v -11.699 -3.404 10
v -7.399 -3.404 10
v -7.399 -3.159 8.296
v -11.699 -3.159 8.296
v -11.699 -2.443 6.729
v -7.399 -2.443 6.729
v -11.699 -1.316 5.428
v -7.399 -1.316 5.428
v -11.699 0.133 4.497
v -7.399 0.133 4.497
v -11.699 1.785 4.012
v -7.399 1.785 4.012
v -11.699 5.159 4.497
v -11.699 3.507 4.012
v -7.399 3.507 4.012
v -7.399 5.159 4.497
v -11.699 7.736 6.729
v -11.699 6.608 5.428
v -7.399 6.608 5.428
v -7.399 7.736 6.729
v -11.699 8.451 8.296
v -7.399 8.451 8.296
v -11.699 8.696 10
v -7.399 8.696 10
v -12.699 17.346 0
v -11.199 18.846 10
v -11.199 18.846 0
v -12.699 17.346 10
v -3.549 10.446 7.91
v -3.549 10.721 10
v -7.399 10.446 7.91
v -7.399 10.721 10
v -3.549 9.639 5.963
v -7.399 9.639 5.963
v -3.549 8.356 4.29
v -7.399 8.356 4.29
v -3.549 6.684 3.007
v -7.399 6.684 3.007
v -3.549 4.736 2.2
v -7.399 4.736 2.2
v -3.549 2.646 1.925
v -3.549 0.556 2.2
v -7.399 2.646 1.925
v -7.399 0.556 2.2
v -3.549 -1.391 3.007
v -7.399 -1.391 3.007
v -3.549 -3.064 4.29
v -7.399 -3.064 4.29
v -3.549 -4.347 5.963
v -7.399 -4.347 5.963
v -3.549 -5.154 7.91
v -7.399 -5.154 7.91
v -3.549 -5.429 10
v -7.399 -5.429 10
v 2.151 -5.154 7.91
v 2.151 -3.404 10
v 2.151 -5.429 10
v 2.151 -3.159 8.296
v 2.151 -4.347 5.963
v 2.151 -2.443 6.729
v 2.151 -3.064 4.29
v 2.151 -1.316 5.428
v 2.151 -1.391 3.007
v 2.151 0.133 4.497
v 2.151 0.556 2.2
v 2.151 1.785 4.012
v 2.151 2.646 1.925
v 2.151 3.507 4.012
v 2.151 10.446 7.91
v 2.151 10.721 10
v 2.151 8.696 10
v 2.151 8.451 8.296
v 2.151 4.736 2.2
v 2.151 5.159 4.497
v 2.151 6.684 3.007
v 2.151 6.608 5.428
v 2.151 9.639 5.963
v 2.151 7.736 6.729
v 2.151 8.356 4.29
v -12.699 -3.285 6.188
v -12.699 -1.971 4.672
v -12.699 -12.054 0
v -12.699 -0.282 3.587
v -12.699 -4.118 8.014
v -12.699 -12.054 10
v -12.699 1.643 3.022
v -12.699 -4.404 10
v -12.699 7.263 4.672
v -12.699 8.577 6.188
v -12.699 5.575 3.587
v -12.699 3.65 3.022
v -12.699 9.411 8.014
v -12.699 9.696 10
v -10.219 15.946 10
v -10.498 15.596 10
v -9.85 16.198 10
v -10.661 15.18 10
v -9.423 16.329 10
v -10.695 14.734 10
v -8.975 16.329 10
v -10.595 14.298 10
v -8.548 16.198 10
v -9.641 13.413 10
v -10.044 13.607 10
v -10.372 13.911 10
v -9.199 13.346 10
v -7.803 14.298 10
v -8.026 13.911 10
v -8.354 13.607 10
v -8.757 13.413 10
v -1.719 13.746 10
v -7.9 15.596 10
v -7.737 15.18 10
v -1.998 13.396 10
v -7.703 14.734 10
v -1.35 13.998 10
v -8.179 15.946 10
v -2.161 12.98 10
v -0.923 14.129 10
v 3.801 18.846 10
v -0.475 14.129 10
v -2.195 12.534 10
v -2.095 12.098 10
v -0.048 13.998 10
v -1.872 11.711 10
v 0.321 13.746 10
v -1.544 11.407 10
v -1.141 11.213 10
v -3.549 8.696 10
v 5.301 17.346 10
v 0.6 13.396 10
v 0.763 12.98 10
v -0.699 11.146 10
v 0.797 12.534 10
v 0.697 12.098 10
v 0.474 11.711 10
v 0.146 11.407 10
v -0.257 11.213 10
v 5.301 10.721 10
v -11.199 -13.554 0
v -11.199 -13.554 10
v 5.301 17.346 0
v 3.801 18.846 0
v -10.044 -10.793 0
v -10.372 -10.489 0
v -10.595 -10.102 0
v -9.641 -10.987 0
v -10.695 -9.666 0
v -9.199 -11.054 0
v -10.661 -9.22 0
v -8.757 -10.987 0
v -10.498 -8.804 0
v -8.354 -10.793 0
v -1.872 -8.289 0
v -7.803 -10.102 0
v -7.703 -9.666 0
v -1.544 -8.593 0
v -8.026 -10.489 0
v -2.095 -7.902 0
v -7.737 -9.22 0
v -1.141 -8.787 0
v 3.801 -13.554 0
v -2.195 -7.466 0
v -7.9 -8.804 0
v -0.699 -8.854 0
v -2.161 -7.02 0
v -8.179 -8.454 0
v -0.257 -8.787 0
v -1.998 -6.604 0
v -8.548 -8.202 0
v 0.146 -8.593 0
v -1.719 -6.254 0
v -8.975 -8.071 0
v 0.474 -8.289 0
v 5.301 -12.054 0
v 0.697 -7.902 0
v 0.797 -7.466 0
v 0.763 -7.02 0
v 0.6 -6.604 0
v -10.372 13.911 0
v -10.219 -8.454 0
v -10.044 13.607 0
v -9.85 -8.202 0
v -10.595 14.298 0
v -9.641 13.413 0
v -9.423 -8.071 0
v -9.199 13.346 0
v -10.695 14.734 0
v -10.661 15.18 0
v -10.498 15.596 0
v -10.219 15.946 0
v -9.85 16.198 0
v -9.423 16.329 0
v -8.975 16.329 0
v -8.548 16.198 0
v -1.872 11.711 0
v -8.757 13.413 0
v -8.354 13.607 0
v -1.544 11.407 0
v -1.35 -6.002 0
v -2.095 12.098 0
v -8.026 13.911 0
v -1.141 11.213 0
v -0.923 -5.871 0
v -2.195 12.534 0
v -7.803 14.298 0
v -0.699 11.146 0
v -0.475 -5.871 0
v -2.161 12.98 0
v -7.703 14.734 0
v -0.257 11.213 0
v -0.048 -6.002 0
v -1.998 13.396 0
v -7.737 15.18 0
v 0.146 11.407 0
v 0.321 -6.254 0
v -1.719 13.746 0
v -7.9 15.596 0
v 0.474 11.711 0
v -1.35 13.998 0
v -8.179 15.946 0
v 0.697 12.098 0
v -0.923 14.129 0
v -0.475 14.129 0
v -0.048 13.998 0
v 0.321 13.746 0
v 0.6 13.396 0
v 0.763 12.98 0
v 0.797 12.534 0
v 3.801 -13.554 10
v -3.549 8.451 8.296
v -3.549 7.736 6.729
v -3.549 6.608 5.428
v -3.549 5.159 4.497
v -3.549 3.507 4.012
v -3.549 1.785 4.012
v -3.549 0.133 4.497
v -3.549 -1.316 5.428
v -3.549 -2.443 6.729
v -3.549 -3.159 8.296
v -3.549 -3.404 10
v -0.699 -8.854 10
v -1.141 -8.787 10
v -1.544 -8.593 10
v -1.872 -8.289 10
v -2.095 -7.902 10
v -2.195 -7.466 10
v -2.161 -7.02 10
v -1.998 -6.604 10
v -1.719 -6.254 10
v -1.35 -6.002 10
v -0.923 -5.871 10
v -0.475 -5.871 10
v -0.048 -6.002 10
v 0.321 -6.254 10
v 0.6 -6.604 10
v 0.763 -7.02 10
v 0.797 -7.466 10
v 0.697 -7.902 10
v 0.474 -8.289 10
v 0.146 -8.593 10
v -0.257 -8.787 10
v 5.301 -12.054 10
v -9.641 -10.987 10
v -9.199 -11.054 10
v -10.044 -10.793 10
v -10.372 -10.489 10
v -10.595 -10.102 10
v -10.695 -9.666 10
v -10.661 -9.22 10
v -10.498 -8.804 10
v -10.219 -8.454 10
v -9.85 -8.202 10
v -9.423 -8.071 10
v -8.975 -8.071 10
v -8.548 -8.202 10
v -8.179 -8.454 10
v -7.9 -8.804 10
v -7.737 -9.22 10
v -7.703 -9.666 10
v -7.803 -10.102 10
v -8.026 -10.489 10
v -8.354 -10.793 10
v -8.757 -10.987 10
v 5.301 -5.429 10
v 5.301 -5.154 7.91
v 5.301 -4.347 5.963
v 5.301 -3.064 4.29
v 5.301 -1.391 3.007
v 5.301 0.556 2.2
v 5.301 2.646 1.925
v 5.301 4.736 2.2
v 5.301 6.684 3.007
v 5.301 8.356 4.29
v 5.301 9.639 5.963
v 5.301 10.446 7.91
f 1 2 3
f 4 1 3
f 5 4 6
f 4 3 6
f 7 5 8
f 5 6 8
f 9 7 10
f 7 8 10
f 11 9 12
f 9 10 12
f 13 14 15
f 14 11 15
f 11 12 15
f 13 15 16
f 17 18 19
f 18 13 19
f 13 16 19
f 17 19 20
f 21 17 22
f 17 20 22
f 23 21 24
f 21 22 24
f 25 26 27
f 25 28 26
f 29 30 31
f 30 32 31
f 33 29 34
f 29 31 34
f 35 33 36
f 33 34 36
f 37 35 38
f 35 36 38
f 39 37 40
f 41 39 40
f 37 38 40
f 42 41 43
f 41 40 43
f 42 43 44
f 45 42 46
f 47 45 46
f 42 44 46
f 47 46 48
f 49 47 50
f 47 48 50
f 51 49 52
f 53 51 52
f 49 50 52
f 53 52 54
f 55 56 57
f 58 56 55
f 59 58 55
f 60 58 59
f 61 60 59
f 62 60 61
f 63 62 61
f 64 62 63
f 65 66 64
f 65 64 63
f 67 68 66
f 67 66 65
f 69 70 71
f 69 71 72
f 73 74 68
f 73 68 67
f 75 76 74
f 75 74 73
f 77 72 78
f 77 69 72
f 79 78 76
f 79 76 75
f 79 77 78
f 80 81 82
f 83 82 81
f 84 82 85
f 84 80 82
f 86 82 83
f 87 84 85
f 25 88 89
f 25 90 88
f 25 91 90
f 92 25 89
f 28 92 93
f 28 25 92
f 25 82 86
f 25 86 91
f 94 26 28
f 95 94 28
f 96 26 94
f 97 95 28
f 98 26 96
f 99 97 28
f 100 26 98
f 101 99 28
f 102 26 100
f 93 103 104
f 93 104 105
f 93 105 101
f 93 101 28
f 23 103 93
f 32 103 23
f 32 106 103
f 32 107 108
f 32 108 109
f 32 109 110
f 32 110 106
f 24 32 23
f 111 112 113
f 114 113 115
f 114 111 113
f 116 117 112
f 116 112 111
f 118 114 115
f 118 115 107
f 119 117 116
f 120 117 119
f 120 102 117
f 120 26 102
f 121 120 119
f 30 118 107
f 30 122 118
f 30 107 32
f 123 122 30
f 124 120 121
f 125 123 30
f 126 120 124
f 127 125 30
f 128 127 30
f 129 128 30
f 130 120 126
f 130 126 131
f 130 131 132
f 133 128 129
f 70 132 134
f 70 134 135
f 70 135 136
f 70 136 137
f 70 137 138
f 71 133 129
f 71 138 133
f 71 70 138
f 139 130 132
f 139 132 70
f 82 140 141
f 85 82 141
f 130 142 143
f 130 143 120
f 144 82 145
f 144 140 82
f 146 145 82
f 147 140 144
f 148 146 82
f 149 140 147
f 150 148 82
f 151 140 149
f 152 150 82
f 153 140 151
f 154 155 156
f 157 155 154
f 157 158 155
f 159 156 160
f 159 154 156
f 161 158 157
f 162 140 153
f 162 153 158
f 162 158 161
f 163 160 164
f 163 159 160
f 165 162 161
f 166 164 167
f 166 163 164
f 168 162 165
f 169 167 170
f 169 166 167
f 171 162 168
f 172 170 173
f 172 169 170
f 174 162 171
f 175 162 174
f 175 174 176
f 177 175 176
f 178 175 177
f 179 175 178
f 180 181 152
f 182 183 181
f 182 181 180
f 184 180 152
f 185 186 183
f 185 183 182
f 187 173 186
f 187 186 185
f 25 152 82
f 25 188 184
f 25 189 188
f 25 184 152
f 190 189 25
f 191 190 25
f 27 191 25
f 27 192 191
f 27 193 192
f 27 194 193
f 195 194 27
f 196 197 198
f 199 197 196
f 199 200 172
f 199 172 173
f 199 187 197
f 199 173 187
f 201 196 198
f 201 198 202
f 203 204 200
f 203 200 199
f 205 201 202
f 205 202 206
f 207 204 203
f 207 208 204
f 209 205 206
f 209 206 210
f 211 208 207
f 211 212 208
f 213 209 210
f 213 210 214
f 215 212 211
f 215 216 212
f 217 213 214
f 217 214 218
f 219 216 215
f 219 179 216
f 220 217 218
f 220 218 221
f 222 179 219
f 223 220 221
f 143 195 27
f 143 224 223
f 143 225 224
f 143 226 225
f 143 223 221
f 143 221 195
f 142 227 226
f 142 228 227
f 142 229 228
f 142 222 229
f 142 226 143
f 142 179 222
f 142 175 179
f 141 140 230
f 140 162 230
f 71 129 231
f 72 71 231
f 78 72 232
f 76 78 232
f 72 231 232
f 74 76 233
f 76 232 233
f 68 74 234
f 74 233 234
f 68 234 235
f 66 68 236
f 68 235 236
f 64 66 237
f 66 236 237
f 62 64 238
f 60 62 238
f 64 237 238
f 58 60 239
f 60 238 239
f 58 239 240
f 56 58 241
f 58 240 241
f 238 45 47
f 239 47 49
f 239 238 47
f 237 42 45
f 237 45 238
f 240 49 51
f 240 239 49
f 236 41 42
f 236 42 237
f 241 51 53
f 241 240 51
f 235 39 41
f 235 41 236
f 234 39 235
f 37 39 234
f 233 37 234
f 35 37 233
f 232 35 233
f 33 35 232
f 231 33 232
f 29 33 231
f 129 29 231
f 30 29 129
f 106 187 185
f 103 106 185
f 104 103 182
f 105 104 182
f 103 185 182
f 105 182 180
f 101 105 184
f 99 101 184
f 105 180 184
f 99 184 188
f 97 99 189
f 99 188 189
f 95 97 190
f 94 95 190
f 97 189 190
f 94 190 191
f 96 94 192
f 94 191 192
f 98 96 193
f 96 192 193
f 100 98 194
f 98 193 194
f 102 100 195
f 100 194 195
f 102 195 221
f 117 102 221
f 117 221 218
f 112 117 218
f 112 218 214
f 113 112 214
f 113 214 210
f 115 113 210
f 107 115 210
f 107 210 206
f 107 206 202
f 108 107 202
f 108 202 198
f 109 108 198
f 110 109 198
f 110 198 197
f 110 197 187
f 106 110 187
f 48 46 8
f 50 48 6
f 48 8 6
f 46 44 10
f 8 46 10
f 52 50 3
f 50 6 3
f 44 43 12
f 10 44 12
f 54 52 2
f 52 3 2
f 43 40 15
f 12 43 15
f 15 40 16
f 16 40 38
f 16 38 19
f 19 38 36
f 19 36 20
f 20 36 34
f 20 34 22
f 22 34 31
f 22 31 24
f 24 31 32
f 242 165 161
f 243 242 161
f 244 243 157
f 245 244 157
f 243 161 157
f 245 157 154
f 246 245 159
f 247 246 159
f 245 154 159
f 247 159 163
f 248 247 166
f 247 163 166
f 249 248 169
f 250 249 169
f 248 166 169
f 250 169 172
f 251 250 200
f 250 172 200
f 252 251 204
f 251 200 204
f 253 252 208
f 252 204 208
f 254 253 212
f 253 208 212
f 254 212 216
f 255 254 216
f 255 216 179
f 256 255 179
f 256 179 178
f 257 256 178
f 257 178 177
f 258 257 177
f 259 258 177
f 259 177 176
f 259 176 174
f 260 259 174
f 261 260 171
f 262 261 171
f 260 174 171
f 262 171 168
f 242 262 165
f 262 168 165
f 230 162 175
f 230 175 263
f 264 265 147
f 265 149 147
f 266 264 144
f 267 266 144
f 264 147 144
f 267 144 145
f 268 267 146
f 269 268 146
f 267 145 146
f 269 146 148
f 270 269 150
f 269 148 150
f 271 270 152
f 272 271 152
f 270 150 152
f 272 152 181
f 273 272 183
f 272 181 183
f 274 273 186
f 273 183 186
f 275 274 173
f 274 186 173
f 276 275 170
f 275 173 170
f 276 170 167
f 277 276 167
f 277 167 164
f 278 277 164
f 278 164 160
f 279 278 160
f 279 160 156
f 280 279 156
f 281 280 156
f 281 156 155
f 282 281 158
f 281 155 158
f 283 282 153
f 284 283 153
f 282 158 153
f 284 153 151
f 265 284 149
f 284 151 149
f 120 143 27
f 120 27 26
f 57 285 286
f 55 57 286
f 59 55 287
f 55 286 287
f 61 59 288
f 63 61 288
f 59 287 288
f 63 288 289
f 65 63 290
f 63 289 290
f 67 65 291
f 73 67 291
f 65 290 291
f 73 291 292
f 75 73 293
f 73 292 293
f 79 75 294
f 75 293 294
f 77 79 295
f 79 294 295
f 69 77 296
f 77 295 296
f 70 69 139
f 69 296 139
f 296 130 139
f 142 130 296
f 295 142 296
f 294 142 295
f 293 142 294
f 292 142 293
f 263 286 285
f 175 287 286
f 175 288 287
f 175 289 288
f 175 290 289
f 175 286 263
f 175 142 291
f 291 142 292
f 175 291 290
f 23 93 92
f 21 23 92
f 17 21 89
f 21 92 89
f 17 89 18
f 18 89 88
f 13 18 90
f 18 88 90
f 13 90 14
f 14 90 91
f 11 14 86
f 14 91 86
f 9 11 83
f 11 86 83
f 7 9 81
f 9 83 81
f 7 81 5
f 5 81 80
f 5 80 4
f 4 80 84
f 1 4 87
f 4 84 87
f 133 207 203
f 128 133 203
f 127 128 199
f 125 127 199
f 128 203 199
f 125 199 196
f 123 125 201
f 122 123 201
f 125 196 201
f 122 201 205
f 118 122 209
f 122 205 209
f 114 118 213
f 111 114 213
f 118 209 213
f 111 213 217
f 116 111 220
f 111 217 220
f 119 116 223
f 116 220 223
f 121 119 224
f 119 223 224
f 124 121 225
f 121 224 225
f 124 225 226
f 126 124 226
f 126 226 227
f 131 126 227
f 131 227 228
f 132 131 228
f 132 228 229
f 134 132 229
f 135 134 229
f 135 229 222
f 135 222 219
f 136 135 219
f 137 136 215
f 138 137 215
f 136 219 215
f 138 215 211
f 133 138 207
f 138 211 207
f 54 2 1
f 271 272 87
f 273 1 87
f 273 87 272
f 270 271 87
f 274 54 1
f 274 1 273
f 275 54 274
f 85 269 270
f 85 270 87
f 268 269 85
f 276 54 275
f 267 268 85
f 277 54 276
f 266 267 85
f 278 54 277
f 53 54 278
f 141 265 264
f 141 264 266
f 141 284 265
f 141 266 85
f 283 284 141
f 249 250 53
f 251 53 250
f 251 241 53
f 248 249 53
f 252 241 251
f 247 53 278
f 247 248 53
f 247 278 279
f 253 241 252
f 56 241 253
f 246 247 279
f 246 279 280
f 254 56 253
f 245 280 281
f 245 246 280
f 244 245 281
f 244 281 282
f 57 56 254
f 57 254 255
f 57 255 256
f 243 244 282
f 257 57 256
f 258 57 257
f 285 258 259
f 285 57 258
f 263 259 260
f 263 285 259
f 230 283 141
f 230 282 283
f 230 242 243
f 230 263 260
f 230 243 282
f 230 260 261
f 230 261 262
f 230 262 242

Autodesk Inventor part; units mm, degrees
ref_plane "YZ Plane" through (0, 0, 0) normal (1, 0, 0) x (0, 1, 0)
ref_plane "XZ Plane" through (0, 0, 0) normal (0, 1, 0) x (-1, 0, 0)
ref_plane "XY Plane" through (0, 0, 0) normal (0, 0, 1) x (1, 0, 0)
sketch "Szkic1" plane through (0, 0, 0) normal (0, 0, 1) x (1, 0, 0)
  line L0 (-10.699, 18.8462) -> (5.301, 18.8462)
  line L1 (5.301, 18.8462) -> (5.301, -13.5538)
  line L2 (5.301, -13.5538) -> (-10.699, -13.5538)
  line L3 (-10.699, -13.5538) -> (-10.699, 18.8462)
  point P0 (0, 0)
  dimension "d0" = 16
  dimension "d1" = 32.4
extrude "Wyciągnięcie proste1" add sketch "Szkic1" along normal blind 10
sketch "Szkic2" plane through (-10.699, -13.5538, 0) normal (-1, 0, 0) x (0, 0, 1)
  line L0 (0, 0) -> (0, 32.4) projected
  line L1 (0, 0) -> (10, 0) projected
  line L2 (10, 32.4) -> (10, 0) projected
  line L3 (0, 32.4) -> (10, 32.4) projected
  line L4 (10, 32.4) -> (10, 0) projected
  circle A0 centre (10, 16.2) radius 6.05
  point P0 (0, 13.5538)
  dimension "d4" = 32.4
  dimension "d5" = 16.2
  dimension "d6" = 12.1
extrude "Wyciągnięcie proste2" cut sketch "Szkic2" against normal blind 13 contours A0 L2 | L2 A0
sketch "Szkic3" plane through (-10.699, -13.5538, 0) normal (-1, 0, 0) x (0, 0, 1)
  arc A0 (10, 22.25) -> (10, 10.15) centre (10, 16.2) ccw projected
  line L0 (10, 32.4) -> (10, 22.25) projected
  line L1 (0, 32.4) -> (10, 32.4) projected
  line L2 (0, 0) -> (0, 32.4) projected
  line L3 (0, 0) -> (10, 0) projected
  line L4 (10, 10.15) -> (10, 0) projected
  arc A1 (10, 24.275) -> (10, 8.125) centre (10, 16.2) ccw
  point P0 (0, 13.5538)
  dimension "d9" = 16.15
extrude "Wyciągnięcie proste3" cut sketch "Szkic3" against normal blind 7.15 contours A0 L4 A1 L0
extrude "Wyciągnięcie proste4" add sketch "Szkic3" against normal blind 3.3 contours A0 L4 A1 L0
sketch "Szkic6" plane through (5.301, -13.5538, 0) normal (1, 0, 0) x (0, 0, -1)
  arc A0 (-10, 8.125) -> (-10, 24.275) centre (-10, 16.2) ccw projected
  line L0 (0, 32.4) -> (0, 0) projected
  line L1 (0, 32.4) -> (-10, 32.4) projected
  line L2 (-10, 0) -> (-10, 32.4) projected
  line L3 (0, 0) -> (-10, 0) projected
  arc A1 (-10, 8.125) -> (-10, 24.275) centre (-10, 16.2) ccw
  point P0 (0, 13.5538)
extrude "Wyciągnięcie proste5" cut sketch "Szkic6" against normal blind 3.15 contours L2 A0
sketch "Szkic7" plane through (0, 0, 10) normal (0, 0, 1) x (1, 0, 0)
  line L0 (5.301, -5.4288) -> (2.151, -5.4288) projected
  line L1 (2.151, -5.4288) -> (2.151, -3.4038) projected
  line L2 (2.151, -3.4038) -> (-3.549, -3.4038) projected
  line L3 (-3.549, -3.4038) -> (-3.549, -5.4288) projected
  line L4 (-3.549, -5.4288) -> (-7.399, -5.4288) projected
  line L5 (-7.399, -3.4038) -> (-7.399, -5.4288) projected
  line L6 (-10.699, -3.4038) -> (-7.399, -3.4038) projected
  line L7 (-10.699, -3.4038) -> (-10.699, -13.5538) projected
  line L8 (-10.699, -13.5538) -> (5.301, -13.5538) projected
  line L9 (5.301, -13.5538) -> (5.301, -5.4288) projected
  line L10 (2.151, 10.7212) -> (5.301, 10.7212) projected
  line L11 (5.301, 10.7212) -> (5.301, 18.8462) projected
  line L12 (5.301, 18.8462) -> (-10.699, 18.8462) projected
  line L13 (-10.699, 18.8462) -> (-10.699, 8.6962) projected
  line L14 (-10.699, 8.6962) -> (-7.399, 8.6962) projected
  line L15 (-7.399, 10.7212) -> (-7.399, 8.6962) projected
  line L16 (-7.399, 10.7212) -> (-3.549, 10.7212) projected
  line L17 (-3.549, 10.7212) -> (-3.549, 8.6962) projected
  line L18 (-3.549, 8.6962) -> (2.151, 8.6962) projected
  line L19 (2.151, 8.6962) -> (2.151, 10.7212) projected
  point P0 (0, 0)
  point P1 (-0.699, -7.3538)
  point P2 (-0.699, 12.6462)
  dimension "d46" = 20
  dimension "d47" = 32.4
  dimension "d48" = 6.2
  dimension "d49" = 6.2
  dimension "d50" = 5.7
  dimension "d96" = 10
  dimension "d97" = 10
hole "Otwór3" at (-0.699, -7.3538, 10) at (-0.699, 12.6462, 10) direction (0, 0, -1) diameter 3 end through all
chamfer "Faza4" distance 1.5 angle 45 2 edges at (5.301, -13.5538, 5) (5.301, 18.8462, 5)
sketch "Szkic9" plane through (-10.699, -13.5538, 0) normal (-1, 0, 0) x (0, 0, 1)
  line L0 (10, 32.4) -> (10, 22.25) projected
  line L1 (0, 32.4) -> (10, 32.4) projected
  line L2 (0, 0) -> (0, 32.4) projected
  line L3 (0, 0) -> (10, 0) projected
  line L4 (10, 10.15) -> (10, 0) projected
  arc A0 (10, 22.25) -> (10, 10.15) centre (10, 16.2) ccw projected
  point P0 (0, 13.5538)
extrude "Wyciągnięcie proste7" add sketch "Szkic9" along normal blind 2
chamfer "Faza8" distance 1.5 angle 45 2 edges at (-12.699, -13.5538, 5) (-12.699, 18.8462, 5)
chamfer "Faza9" distance 1 angle 45 1 edges at (-12.699, 2.6462, 3.95)
sketch "Szkic10" plane through (0, 0, 10) normal (0, 0, 1) x (1, 0, 0)
  circle A0 centre (-0.699, -7.3538) radius 1.5 projected
  line L0 (-12.699, -4.4038) -> (-11.699, -3.4038) projected
  line L1 (-12.699, -12.0538) -> (-12.699, -4.4038) projected
  line L2 (-11.199, -13.5538) -> (-12.699, -12.0538) projected
  line L3 (3.801, -13.5538) -> (-11.199, -13.5538) projected
  line L4 (5.301, -12.0538) -> (3.801, -13.5538) projected
  line L5 (5.301, -12.0538) -> (5.301, -5.4288) projected
  line L6 (5.301, -5.4288) -> (2.151, -5.4288) projected
  line L7 (2.151, -5.4288) -> (2.151, -3.4038) projected
  line L8 (2.151, -3.4038) -> (-3.549, -3.4038) projected
  line L9 (-3.549, -3.4038) -> (-3.549, -5.4288) projected
  line L10 (-3.549, -5.4288) -> (-7.399, -5.4288) projected
  line L11 (-7.399, -3.4038) -> (-7.399, -5.4288) projected
  line L12 (-11.699, -3.4038) -> (-7.399, -3.4038) projected
  line L13 (-11.699, 8.6962) -> (-12.699, 9.6962) projected
  line L14 (-7.399, 8.6962) -> (-11.699, 8.6962) projected
  line L15 (-7.399, 10.7212) -> (-7.399, 8.6962) projected
  line L16 (-7.399, 10.7212) -> (-3.549, 10.7212) projected
  line L17 (-3.549, 10.7212) -> (-3.549, 8.6962) projected
  line L18 (-3.549, 8.6962) -> (2.151, 8.6962) projected
  line L19 (2.151, 8.6962) -> (2.151, 10.7212) projected
  line L20 (2.151, 10.7212) -> (5.301, 10.7212) projected
  line L21 (5.301, 10.7212) -> (5.301, 17.3462) projected
  line L22 (3.801, 18.8462) -> (5.301, 17.3462) projected
  line L23 (3.801, 18.8462) -> (-11.199, 18.8462) projected
  line L24 (-12.699, 17.3462) -> (-11.199, 18.8462) projected
  line L25 (-12.699, 9.6962) -> (-12.699, 17.3462) projected
  circle A1 centre (-0.699, 12.6462) radius 1.5 projected
  point P0 (0, 0)
  point P1 (-9.199, -9.5538)
  point P2 (-9.199, 14.8462)
  dimension "d106" = 4
  dimension "d107" = 4
  dimension "d108" = 3.5
  dimension "d109" = 3.5
hole "Otwór4" at (-9.199, -9.5538, 10) at (-9.199, 14.8462, 10) direction (0, 0, -1) diameter 3 end through all
equation "\"d5\" = 0.5 * d4"
equation "\"d48\" = -0.5 * d46 + 0.5 * d47"
properties part number "3DP_ABS_E3D_V6_Mount"
